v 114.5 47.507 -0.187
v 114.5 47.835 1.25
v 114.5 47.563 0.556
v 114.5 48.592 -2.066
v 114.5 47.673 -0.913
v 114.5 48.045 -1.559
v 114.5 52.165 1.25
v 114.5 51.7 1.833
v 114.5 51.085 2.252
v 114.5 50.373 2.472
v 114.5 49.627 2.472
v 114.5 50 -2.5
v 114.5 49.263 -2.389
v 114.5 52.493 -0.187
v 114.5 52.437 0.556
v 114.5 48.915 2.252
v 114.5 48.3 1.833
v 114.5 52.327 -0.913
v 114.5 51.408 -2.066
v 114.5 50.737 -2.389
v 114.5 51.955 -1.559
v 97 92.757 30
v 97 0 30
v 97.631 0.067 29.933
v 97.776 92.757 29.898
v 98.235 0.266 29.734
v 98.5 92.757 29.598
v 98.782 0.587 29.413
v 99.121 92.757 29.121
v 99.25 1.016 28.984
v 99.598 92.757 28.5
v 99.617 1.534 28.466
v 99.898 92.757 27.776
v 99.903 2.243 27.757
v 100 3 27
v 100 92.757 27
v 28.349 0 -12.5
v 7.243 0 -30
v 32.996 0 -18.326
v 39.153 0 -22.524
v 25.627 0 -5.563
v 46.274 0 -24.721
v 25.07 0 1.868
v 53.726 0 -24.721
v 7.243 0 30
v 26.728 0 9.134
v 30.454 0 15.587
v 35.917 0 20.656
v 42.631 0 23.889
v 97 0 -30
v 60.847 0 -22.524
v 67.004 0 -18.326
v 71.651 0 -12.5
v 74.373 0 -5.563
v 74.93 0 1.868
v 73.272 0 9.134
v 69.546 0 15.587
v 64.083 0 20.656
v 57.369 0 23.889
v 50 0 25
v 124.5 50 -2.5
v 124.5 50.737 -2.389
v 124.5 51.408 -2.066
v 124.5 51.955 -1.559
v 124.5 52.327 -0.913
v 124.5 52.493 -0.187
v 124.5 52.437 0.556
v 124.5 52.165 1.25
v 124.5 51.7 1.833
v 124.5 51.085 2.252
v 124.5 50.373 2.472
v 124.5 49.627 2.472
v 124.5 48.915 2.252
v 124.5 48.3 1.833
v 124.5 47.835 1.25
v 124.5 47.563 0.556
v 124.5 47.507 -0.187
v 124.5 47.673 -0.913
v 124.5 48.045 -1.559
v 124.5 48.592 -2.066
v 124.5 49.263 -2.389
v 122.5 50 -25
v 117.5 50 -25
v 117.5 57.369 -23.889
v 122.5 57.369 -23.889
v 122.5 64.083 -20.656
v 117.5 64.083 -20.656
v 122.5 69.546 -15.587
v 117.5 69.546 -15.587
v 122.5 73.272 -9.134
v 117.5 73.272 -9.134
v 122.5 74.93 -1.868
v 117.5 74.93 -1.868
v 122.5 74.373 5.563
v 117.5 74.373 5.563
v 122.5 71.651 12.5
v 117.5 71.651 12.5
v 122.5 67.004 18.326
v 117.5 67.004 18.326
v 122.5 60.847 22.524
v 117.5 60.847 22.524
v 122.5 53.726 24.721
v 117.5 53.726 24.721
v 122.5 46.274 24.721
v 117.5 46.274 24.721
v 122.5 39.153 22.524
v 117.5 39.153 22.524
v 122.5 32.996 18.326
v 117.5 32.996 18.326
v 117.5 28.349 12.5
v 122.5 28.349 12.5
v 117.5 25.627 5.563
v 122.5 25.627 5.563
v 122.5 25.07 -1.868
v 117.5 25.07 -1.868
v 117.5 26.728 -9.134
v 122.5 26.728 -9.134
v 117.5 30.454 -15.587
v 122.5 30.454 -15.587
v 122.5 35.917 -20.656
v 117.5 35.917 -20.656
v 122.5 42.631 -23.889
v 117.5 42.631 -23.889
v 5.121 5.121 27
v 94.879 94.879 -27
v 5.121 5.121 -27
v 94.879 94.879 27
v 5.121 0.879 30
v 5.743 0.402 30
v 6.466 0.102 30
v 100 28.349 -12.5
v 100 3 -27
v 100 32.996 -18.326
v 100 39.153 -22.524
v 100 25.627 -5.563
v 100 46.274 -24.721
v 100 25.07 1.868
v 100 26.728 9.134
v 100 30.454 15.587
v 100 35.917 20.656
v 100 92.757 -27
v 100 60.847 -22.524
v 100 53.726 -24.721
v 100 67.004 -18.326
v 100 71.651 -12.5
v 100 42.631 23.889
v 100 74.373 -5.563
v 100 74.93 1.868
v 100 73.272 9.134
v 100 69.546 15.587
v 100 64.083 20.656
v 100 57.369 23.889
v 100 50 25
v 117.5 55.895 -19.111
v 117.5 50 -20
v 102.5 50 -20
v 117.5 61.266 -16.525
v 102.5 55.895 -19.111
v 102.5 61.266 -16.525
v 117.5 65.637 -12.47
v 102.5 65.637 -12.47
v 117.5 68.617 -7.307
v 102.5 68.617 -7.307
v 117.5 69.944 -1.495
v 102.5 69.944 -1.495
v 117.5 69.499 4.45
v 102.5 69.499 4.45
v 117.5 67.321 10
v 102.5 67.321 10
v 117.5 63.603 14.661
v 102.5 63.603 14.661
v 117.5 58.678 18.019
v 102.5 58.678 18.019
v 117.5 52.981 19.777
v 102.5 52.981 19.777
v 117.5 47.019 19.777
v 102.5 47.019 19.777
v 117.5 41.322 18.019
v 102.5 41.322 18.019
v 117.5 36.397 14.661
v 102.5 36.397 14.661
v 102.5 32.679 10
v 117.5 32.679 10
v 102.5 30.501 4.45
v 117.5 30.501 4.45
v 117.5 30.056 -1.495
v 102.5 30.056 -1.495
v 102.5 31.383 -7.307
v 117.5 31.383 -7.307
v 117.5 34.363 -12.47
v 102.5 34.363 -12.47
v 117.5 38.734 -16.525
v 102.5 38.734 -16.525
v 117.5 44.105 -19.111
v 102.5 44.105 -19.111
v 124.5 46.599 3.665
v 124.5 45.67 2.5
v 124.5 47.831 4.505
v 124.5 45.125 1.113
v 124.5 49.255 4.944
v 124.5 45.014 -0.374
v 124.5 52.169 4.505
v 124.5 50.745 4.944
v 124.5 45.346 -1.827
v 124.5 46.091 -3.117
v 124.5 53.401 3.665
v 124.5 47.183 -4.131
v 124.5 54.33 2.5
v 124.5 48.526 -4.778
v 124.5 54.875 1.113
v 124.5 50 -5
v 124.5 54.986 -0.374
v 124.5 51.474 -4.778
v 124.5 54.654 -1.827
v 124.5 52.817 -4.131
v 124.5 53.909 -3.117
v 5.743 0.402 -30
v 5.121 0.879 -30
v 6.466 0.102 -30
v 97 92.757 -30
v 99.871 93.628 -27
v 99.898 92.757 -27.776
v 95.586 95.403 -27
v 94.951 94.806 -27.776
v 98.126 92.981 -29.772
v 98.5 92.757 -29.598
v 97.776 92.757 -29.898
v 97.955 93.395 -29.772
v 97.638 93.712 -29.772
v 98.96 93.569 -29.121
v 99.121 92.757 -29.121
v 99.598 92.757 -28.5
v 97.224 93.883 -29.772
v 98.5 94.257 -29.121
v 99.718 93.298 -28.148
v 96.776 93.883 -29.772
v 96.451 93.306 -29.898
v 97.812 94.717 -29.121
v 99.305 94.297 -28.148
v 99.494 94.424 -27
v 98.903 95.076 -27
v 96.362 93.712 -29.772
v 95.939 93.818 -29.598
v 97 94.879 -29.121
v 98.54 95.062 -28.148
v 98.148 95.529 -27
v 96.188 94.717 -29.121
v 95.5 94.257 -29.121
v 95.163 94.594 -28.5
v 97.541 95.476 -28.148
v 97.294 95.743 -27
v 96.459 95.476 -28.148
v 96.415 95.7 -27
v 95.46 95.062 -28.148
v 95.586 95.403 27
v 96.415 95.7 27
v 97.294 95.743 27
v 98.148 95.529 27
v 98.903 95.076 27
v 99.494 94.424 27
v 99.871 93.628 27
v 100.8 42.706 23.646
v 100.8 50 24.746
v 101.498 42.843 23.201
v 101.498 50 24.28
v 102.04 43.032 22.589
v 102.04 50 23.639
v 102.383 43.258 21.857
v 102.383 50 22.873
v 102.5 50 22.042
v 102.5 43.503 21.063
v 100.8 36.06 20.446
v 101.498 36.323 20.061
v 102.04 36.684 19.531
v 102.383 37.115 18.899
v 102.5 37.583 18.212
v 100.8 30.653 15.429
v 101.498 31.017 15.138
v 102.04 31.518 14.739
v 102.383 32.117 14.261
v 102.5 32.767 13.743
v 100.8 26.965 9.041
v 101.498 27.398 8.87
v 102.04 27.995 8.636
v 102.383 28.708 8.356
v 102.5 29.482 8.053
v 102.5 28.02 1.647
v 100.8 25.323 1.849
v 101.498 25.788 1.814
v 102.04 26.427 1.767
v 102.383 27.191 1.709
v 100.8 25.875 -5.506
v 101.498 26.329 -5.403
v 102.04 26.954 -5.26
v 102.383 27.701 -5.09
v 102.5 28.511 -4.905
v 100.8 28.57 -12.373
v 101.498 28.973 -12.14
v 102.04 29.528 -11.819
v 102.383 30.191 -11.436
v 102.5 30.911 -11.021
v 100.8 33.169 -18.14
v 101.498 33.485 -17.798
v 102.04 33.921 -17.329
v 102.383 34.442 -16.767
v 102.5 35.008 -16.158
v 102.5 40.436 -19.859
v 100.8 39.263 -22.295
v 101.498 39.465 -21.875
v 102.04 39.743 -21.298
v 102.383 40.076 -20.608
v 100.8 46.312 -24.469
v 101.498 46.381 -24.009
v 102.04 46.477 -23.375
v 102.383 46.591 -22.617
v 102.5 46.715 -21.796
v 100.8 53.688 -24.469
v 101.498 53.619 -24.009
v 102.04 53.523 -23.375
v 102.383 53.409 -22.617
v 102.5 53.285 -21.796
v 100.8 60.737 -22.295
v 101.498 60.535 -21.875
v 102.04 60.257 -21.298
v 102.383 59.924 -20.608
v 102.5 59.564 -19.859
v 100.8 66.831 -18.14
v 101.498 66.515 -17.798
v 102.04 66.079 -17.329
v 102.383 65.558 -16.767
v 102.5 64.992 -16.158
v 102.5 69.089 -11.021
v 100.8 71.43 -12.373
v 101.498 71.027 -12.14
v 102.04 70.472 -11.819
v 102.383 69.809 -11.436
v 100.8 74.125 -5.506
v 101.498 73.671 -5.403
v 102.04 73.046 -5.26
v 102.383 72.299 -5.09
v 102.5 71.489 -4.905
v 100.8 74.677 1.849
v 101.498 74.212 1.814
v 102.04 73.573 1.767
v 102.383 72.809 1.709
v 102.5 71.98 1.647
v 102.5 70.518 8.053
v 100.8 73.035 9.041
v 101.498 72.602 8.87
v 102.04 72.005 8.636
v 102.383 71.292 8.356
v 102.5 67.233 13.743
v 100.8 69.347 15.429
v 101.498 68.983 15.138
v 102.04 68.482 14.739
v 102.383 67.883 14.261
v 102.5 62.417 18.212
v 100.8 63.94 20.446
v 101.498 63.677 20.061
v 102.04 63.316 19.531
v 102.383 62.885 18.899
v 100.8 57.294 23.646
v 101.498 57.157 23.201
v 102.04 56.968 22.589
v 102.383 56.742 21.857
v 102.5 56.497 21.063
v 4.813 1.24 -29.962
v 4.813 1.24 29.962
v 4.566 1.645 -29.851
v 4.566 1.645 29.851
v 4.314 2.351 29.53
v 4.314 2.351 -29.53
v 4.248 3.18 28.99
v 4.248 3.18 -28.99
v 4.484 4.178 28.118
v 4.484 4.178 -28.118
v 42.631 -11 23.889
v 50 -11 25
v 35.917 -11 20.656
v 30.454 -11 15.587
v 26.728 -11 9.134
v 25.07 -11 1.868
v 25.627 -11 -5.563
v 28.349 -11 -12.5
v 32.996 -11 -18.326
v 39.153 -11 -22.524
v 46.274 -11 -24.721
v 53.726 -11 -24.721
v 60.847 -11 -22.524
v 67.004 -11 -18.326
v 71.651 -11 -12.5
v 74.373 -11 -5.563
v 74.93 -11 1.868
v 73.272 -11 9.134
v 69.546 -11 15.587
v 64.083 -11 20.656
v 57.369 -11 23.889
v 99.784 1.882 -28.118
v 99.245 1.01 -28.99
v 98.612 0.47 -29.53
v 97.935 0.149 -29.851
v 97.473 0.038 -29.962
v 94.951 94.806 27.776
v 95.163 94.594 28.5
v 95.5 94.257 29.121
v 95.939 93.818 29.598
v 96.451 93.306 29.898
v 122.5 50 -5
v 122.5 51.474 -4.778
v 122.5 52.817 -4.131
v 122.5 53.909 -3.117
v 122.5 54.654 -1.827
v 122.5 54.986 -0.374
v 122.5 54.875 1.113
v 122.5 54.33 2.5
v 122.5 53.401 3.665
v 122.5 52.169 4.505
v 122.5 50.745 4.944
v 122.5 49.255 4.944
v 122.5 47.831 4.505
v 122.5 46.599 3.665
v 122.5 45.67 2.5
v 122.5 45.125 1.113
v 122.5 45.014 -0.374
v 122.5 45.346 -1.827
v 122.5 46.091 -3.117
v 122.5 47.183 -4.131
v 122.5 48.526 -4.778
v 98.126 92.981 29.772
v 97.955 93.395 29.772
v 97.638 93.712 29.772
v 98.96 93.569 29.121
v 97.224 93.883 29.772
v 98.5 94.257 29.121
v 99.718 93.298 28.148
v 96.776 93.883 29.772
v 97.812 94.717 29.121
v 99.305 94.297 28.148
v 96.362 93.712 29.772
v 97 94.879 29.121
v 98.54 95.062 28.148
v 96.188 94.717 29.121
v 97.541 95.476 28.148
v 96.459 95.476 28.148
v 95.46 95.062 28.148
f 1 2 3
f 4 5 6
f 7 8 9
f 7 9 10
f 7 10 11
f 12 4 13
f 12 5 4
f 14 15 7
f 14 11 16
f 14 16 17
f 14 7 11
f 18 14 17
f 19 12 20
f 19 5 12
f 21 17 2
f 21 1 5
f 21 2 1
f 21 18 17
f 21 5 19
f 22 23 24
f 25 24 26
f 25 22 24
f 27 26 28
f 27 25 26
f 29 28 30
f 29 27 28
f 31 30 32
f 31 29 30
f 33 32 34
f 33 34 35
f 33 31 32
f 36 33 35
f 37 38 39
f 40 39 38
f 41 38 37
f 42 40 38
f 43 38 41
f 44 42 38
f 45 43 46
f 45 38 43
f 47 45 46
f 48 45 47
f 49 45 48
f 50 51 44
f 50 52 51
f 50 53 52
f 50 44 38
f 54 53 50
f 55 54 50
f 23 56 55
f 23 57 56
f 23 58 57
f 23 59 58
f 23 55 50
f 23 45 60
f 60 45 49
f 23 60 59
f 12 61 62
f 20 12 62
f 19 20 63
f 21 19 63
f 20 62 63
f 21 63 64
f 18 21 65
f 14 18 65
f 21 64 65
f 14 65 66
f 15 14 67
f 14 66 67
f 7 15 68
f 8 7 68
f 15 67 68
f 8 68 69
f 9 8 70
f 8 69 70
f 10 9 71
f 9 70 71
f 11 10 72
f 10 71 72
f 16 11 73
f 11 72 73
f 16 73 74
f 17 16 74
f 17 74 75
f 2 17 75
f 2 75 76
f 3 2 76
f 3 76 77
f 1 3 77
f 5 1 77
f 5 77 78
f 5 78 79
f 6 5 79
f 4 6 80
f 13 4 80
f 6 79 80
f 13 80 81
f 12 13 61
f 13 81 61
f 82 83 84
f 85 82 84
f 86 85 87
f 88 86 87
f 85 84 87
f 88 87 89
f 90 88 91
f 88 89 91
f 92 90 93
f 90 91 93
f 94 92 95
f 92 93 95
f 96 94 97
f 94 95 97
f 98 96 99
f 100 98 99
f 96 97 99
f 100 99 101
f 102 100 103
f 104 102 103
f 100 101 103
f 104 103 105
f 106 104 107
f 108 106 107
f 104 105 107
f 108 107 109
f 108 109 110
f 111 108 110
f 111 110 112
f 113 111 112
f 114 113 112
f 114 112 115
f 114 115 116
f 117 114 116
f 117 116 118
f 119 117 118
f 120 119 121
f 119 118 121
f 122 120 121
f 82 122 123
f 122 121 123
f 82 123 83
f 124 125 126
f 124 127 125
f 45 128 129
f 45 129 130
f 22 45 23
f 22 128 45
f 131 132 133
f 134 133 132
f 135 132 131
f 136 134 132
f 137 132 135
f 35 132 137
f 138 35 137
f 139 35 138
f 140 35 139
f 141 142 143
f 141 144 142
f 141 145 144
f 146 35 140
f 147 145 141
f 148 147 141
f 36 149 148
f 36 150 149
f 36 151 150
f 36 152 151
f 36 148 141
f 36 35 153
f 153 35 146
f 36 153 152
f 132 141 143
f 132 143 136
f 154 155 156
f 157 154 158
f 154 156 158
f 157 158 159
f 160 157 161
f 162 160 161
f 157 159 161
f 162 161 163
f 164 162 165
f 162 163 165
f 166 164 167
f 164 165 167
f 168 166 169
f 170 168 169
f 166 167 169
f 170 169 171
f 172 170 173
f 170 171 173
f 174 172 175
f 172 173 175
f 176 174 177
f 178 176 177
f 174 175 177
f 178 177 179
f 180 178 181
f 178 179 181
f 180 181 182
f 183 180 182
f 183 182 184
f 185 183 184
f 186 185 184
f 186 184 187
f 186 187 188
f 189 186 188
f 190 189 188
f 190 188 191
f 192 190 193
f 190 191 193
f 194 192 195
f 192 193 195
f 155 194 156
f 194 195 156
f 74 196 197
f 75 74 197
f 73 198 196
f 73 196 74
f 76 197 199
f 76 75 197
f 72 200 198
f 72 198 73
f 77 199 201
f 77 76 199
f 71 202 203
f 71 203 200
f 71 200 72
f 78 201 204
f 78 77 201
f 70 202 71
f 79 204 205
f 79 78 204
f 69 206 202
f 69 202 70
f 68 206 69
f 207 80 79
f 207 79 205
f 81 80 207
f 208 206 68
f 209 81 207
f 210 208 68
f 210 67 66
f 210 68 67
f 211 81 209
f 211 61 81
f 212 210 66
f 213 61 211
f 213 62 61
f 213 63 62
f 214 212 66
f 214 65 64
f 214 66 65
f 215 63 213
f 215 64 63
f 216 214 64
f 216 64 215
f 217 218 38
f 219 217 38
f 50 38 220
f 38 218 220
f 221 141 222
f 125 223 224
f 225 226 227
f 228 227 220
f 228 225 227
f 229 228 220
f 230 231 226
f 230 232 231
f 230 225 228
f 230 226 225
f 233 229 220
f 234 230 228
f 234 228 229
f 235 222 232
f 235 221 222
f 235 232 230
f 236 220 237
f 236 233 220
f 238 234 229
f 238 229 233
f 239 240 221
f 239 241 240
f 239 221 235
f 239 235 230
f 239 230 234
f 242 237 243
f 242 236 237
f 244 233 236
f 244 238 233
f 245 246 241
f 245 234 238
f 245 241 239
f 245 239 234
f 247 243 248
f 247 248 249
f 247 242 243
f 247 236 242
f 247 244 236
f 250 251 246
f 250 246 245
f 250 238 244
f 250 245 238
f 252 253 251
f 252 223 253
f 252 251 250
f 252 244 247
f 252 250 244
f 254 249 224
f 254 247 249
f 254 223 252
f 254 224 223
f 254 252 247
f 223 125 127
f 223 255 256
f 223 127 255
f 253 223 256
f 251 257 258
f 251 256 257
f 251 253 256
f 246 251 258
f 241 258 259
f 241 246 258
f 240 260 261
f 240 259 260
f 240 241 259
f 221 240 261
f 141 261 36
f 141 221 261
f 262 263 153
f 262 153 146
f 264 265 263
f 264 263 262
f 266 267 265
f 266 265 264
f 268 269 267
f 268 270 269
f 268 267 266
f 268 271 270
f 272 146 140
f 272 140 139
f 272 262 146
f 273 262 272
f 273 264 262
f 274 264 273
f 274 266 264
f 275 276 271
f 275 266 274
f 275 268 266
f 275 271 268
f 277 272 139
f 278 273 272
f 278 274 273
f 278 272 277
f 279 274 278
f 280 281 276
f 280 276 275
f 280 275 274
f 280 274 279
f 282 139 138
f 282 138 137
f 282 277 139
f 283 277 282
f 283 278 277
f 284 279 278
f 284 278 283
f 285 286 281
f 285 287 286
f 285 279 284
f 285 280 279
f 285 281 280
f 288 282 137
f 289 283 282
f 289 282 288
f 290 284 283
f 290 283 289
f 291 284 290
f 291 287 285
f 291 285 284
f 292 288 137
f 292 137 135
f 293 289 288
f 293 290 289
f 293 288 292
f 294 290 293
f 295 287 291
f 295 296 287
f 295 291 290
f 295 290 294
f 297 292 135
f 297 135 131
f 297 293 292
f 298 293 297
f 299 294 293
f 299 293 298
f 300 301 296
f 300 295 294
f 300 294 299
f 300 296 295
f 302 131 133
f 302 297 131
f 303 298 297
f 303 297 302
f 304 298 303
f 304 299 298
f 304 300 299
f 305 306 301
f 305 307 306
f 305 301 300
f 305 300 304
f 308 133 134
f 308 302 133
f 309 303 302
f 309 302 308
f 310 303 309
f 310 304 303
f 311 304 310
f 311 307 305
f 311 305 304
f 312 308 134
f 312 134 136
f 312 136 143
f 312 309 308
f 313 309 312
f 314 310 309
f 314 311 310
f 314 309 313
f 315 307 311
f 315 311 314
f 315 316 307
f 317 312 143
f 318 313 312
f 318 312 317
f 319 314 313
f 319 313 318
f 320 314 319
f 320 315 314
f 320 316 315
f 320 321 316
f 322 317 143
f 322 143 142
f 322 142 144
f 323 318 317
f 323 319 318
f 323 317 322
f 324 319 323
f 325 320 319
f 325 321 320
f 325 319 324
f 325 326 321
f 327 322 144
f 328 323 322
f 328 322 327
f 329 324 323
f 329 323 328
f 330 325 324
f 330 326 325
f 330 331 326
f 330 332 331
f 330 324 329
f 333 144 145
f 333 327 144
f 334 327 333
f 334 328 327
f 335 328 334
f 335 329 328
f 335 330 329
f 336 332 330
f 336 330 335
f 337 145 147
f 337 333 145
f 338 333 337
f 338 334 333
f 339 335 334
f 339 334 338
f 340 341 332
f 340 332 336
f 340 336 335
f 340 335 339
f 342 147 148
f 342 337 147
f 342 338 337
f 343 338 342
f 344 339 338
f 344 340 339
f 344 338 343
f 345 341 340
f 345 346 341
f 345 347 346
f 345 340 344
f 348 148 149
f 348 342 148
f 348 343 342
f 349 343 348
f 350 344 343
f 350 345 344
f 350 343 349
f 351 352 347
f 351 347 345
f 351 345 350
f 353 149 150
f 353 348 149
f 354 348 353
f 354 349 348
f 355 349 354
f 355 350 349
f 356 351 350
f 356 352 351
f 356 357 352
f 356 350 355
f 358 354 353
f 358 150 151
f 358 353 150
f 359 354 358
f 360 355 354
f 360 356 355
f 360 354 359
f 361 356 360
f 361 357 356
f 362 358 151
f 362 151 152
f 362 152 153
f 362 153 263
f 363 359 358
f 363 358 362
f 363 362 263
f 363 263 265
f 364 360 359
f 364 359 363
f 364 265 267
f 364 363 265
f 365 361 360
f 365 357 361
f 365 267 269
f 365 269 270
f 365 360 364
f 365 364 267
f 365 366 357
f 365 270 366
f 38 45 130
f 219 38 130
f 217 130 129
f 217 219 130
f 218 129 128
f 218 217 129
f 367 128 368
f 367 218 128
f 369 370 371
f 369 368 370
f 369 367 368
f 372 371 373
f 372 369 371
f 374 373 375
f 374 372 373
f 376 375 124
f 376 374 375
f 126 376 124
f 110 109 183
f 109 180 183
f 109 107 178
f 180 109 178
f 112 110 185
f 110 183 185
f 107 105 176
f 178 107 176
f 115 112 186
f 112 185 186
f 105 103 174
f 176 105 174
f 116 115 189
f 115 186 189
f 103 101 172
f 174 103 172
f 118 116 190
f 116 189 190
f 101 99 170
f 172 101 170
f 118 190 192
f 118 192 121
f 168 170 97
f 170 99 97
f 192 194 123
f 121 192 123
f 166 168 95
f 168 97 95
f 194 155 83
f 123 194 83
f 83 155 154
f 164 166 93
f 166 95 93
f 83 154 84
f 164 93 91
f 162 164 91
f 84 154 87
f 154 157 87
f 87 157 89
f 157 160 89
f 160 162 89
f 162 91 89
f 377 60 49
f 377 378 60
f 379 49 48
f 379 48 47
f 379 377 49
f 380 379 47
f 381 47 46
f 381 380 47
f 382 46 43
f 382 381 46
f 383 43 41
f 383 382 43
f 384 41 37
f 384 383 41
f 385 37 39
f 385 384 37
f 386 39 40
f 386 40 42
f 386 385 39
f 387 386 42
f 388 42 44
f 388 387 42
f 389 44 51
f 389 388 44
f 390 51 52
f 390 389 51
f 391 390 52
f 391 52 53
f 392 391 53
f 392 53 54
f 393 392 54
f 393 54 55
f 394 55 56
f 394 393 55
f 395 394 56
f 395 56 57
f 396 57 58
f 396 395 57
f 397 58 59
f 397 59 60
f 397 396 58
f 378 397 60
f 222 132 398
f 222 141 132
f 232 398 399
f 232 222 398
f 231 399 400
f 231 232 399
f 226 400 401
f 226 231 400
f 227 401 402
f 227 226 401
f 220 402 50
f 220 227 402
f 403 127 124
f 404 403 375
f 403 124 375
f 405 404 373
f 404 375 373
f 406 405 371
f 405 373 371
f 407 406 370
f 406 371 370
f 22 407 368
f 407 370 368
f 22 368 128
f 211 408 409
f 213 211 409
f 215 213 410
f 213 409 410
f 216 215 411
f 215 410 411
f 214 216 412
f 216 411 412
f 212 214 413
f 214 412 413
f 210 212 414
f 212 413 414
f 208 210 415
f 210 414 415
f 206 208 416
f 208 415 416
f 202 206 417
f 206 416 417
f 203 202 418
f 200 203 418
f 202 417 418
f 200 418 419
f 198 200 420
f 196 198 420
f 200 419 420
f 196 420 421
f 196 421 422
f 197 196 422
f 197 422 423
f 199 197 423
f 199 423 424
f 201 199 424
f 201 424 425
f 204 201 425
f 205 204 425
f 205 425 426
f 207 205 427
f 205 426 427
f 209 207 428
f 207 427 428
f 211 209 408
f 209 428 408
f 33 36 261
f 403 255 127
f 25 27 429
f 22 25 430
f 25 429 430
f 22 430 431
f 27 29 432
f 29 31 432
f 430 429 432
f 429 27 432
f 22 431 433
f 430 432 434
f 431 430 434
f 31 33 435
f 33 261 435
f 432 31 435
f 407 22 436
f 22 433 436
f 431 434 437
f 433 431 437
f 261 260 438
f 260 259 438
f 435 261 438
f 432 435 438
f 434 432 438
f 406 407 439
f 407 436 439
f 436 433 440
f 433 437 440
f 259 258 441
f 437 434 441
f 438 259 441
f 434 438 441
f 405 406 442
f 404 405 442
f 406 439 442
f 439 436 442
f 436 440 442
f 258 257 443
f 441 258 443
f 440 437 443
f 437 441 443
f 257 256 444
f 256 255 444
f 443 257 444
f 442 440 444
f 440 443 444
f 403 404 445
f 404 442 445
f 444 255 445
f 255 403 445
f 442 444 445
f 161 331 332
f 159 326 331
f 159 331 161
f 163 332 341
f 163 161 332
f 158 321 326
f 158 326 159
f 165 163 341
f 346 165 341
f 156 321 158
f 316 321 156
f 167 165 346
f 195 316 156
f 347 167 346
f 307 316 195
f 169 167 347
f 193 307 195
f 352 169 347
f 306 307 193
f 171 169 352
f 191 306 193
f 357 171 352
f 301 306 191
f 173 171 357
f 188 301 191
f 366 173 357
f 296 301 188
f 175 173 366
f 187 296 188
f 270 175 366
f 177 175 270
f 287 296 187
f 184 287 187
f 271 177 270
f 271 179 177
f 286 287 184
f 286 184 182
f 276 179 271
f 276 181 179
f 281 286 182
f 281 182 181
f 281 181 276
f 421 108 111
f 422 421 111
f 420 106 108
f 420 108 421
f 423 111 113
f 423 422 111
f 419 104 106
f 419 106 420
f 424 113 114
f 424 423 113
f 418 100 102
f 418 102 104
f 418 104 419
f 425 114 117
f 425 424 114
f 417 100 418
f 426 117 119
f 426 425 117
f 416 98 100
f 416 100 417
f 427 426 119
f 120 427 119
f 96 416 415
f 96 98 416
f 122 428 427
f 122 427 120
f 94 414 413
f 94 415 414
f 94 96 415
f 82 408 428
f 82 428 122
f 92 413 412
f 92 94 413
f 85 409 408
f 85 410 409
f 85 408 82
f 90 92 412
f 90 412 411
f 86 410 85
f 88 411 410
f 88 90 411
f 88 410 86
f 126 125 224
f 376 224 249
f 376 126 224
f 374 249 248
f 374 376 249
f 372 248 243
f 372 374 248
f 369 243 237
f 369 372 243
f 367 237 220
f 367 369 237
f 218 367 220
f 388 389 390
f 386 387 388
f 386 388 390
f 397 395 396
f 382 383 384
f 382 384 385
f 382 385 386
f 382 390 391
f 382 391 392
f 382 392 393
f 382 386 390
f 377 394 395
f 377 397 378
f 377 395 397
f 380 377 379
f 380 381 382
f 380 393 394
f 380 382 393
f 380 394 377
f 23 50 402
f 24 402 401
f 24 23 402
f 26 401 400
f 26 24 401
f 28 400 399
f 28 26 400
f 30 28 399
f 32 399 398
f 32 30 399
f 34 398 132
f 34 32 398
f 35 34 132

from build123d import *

# Parameters (mm, degrees)
BOSS_EXTRUDE1_DEPTH = 30
FILLET1_R           = 3
SKETCH2_R           = 25
BOSS_EXTRUDE2_DEPTH = 11
SKETCH3_R           = 25
BOSS_EXTRUDE3_DEPTH = 2.5
FILLET2_R           = 3
SKETCH5_R           = 20
BOSS_EXTRUDE4_DEPTH = 15
SKETCH6_R           = 25
BOSS_EXTRUDE5_DEPTH = 5
SKETCH7_R           = 5
BOSS_EXTRUDE6_DEPTH = 2
SKETCH8_R           = 2.5
CUT_EXTRUDE2_DEPTH  = 10


with BuildPart() as part:
    # Sketch1 → Boss-Extrude1 (new, symmetric)
    with BuildSketch(Plane.XY):
        Polygon((0, 0), (100, 0), (100, 100), align=None)
    extrude(amount=BOSS_EXTRUDE1_DEPTH, both=True)

    # Fillet1
    fillet1_edges = [part.edges().sort_by_distance(p)[0] for p in [
        (100, 50, 30),
        (100, 50, -30),
        (50, 50, -30),
        (50, 50, 30),
        (100, 100, 0),
        (100, 0, 0),
        (0, 0, 0),
    ]]
    fillet(fillet1_edges, radius=FILLET1_R)

    # Sketch2 → Boss-Extrude2 (add, symmetric)
    with BuildSketch(Plane.XZ):
        with Locations(Location((50, 0, 0), (0, 0, 90))):
            Circle(SKETCH2_R)
    extrude(amount=BOSS_EXTRUDE2_DEPTH, both=True)

    # Sketch3 → Boss-Extrude3 (add, symmetric)
    with BuildSketch(Plane(origin=(100, 0, 0), x_dir=(0, 0, -1), z_dir=(1, 0, 0))):
        with Locations(Location((0, 50, 0), (0, 0, 180))):
            Circle(SKETCH3_R)
    extrude(amount=BOSS_EXTRUDE3_DEPTH, both=True)

    # Fillet2
    # the kernel refuses this fillet: 3 mm, written as the material it takes off along each edge
    with BuildSketch(Plane(origin=(102.5, 50, 0), x_dir=(0, 0, 1), z_dir=(0, 1, 0))) as fillet2_piece_1:
        with BuildLine():
            CenterArc((22.041960108, -3), FILLET2_R, 9.594068227, 80.405931773)
            Line((22.041960108, 0), (22.041960108, 0.06))
            Line((22.041960108, 0.06), (25, 0.06))
            Line((25, 0.06), (25.06, 0))
            ThreePointArc((25.06, 0), (25.06, -1.25), (25.059160798, -2.49))
            Line((25.059160798, -2.49), (25, -2.5))
        make_face()
    revolve(axis=Axis((102.5, 50, 0), (1, 0, 0)), mode=Mode.SUBTRACT)

    # Sketch5 → Boss-Extrude4 (add)
    with BuildSketch(Plane(origin=(102.5, 0, 0), x_dir=(0, 0, -1), z_dir=(1, 0, 0))):
        with Locations((0, 50)):
            Circle(SKETCH5_R)
    extrude(amount=BOSS_EXTRUDE4_DEPTH)

    # Sketch6 → Boss-Extrude5 (add)
    with BuildSketch(Plane(origin=(117.5, 0, 0), x_dir=(0, 0, -1), z_dir=(1, 0, 0))):
        with Locations((0, 50)):
            Circle(SKETCH6_R)
    extrude(amount=BOSS_EXTRUDE5_DEPTH)

    # Sketch7 → Boss-Extrude6 (add)
    with BuildSketch(Plane(origin=(122.5, 0, 0), x_dir=(0, 0, -1), z_dir=(1, 0, 0))):
        with Locations((0, 50)):
            Circle(SKETCH7_R)
    extrude(amount=BOSS_EXTRUDE6_DEPTH)

    # Sketch8 → Cut-Extrude2 (cut)
    with BuildSketch(Plane(origin=(124.5, 0, 0), x_dir=(0, 0, -1), z_dir=(1, 0, 0))):
        with Locations((0, 50)):
            Circle(SKETCH8_R)
    extrude(amount=-CUT_EXTRUDE2_DEPTH, mode=Mode.SUBTRACT)


solid = part.part
